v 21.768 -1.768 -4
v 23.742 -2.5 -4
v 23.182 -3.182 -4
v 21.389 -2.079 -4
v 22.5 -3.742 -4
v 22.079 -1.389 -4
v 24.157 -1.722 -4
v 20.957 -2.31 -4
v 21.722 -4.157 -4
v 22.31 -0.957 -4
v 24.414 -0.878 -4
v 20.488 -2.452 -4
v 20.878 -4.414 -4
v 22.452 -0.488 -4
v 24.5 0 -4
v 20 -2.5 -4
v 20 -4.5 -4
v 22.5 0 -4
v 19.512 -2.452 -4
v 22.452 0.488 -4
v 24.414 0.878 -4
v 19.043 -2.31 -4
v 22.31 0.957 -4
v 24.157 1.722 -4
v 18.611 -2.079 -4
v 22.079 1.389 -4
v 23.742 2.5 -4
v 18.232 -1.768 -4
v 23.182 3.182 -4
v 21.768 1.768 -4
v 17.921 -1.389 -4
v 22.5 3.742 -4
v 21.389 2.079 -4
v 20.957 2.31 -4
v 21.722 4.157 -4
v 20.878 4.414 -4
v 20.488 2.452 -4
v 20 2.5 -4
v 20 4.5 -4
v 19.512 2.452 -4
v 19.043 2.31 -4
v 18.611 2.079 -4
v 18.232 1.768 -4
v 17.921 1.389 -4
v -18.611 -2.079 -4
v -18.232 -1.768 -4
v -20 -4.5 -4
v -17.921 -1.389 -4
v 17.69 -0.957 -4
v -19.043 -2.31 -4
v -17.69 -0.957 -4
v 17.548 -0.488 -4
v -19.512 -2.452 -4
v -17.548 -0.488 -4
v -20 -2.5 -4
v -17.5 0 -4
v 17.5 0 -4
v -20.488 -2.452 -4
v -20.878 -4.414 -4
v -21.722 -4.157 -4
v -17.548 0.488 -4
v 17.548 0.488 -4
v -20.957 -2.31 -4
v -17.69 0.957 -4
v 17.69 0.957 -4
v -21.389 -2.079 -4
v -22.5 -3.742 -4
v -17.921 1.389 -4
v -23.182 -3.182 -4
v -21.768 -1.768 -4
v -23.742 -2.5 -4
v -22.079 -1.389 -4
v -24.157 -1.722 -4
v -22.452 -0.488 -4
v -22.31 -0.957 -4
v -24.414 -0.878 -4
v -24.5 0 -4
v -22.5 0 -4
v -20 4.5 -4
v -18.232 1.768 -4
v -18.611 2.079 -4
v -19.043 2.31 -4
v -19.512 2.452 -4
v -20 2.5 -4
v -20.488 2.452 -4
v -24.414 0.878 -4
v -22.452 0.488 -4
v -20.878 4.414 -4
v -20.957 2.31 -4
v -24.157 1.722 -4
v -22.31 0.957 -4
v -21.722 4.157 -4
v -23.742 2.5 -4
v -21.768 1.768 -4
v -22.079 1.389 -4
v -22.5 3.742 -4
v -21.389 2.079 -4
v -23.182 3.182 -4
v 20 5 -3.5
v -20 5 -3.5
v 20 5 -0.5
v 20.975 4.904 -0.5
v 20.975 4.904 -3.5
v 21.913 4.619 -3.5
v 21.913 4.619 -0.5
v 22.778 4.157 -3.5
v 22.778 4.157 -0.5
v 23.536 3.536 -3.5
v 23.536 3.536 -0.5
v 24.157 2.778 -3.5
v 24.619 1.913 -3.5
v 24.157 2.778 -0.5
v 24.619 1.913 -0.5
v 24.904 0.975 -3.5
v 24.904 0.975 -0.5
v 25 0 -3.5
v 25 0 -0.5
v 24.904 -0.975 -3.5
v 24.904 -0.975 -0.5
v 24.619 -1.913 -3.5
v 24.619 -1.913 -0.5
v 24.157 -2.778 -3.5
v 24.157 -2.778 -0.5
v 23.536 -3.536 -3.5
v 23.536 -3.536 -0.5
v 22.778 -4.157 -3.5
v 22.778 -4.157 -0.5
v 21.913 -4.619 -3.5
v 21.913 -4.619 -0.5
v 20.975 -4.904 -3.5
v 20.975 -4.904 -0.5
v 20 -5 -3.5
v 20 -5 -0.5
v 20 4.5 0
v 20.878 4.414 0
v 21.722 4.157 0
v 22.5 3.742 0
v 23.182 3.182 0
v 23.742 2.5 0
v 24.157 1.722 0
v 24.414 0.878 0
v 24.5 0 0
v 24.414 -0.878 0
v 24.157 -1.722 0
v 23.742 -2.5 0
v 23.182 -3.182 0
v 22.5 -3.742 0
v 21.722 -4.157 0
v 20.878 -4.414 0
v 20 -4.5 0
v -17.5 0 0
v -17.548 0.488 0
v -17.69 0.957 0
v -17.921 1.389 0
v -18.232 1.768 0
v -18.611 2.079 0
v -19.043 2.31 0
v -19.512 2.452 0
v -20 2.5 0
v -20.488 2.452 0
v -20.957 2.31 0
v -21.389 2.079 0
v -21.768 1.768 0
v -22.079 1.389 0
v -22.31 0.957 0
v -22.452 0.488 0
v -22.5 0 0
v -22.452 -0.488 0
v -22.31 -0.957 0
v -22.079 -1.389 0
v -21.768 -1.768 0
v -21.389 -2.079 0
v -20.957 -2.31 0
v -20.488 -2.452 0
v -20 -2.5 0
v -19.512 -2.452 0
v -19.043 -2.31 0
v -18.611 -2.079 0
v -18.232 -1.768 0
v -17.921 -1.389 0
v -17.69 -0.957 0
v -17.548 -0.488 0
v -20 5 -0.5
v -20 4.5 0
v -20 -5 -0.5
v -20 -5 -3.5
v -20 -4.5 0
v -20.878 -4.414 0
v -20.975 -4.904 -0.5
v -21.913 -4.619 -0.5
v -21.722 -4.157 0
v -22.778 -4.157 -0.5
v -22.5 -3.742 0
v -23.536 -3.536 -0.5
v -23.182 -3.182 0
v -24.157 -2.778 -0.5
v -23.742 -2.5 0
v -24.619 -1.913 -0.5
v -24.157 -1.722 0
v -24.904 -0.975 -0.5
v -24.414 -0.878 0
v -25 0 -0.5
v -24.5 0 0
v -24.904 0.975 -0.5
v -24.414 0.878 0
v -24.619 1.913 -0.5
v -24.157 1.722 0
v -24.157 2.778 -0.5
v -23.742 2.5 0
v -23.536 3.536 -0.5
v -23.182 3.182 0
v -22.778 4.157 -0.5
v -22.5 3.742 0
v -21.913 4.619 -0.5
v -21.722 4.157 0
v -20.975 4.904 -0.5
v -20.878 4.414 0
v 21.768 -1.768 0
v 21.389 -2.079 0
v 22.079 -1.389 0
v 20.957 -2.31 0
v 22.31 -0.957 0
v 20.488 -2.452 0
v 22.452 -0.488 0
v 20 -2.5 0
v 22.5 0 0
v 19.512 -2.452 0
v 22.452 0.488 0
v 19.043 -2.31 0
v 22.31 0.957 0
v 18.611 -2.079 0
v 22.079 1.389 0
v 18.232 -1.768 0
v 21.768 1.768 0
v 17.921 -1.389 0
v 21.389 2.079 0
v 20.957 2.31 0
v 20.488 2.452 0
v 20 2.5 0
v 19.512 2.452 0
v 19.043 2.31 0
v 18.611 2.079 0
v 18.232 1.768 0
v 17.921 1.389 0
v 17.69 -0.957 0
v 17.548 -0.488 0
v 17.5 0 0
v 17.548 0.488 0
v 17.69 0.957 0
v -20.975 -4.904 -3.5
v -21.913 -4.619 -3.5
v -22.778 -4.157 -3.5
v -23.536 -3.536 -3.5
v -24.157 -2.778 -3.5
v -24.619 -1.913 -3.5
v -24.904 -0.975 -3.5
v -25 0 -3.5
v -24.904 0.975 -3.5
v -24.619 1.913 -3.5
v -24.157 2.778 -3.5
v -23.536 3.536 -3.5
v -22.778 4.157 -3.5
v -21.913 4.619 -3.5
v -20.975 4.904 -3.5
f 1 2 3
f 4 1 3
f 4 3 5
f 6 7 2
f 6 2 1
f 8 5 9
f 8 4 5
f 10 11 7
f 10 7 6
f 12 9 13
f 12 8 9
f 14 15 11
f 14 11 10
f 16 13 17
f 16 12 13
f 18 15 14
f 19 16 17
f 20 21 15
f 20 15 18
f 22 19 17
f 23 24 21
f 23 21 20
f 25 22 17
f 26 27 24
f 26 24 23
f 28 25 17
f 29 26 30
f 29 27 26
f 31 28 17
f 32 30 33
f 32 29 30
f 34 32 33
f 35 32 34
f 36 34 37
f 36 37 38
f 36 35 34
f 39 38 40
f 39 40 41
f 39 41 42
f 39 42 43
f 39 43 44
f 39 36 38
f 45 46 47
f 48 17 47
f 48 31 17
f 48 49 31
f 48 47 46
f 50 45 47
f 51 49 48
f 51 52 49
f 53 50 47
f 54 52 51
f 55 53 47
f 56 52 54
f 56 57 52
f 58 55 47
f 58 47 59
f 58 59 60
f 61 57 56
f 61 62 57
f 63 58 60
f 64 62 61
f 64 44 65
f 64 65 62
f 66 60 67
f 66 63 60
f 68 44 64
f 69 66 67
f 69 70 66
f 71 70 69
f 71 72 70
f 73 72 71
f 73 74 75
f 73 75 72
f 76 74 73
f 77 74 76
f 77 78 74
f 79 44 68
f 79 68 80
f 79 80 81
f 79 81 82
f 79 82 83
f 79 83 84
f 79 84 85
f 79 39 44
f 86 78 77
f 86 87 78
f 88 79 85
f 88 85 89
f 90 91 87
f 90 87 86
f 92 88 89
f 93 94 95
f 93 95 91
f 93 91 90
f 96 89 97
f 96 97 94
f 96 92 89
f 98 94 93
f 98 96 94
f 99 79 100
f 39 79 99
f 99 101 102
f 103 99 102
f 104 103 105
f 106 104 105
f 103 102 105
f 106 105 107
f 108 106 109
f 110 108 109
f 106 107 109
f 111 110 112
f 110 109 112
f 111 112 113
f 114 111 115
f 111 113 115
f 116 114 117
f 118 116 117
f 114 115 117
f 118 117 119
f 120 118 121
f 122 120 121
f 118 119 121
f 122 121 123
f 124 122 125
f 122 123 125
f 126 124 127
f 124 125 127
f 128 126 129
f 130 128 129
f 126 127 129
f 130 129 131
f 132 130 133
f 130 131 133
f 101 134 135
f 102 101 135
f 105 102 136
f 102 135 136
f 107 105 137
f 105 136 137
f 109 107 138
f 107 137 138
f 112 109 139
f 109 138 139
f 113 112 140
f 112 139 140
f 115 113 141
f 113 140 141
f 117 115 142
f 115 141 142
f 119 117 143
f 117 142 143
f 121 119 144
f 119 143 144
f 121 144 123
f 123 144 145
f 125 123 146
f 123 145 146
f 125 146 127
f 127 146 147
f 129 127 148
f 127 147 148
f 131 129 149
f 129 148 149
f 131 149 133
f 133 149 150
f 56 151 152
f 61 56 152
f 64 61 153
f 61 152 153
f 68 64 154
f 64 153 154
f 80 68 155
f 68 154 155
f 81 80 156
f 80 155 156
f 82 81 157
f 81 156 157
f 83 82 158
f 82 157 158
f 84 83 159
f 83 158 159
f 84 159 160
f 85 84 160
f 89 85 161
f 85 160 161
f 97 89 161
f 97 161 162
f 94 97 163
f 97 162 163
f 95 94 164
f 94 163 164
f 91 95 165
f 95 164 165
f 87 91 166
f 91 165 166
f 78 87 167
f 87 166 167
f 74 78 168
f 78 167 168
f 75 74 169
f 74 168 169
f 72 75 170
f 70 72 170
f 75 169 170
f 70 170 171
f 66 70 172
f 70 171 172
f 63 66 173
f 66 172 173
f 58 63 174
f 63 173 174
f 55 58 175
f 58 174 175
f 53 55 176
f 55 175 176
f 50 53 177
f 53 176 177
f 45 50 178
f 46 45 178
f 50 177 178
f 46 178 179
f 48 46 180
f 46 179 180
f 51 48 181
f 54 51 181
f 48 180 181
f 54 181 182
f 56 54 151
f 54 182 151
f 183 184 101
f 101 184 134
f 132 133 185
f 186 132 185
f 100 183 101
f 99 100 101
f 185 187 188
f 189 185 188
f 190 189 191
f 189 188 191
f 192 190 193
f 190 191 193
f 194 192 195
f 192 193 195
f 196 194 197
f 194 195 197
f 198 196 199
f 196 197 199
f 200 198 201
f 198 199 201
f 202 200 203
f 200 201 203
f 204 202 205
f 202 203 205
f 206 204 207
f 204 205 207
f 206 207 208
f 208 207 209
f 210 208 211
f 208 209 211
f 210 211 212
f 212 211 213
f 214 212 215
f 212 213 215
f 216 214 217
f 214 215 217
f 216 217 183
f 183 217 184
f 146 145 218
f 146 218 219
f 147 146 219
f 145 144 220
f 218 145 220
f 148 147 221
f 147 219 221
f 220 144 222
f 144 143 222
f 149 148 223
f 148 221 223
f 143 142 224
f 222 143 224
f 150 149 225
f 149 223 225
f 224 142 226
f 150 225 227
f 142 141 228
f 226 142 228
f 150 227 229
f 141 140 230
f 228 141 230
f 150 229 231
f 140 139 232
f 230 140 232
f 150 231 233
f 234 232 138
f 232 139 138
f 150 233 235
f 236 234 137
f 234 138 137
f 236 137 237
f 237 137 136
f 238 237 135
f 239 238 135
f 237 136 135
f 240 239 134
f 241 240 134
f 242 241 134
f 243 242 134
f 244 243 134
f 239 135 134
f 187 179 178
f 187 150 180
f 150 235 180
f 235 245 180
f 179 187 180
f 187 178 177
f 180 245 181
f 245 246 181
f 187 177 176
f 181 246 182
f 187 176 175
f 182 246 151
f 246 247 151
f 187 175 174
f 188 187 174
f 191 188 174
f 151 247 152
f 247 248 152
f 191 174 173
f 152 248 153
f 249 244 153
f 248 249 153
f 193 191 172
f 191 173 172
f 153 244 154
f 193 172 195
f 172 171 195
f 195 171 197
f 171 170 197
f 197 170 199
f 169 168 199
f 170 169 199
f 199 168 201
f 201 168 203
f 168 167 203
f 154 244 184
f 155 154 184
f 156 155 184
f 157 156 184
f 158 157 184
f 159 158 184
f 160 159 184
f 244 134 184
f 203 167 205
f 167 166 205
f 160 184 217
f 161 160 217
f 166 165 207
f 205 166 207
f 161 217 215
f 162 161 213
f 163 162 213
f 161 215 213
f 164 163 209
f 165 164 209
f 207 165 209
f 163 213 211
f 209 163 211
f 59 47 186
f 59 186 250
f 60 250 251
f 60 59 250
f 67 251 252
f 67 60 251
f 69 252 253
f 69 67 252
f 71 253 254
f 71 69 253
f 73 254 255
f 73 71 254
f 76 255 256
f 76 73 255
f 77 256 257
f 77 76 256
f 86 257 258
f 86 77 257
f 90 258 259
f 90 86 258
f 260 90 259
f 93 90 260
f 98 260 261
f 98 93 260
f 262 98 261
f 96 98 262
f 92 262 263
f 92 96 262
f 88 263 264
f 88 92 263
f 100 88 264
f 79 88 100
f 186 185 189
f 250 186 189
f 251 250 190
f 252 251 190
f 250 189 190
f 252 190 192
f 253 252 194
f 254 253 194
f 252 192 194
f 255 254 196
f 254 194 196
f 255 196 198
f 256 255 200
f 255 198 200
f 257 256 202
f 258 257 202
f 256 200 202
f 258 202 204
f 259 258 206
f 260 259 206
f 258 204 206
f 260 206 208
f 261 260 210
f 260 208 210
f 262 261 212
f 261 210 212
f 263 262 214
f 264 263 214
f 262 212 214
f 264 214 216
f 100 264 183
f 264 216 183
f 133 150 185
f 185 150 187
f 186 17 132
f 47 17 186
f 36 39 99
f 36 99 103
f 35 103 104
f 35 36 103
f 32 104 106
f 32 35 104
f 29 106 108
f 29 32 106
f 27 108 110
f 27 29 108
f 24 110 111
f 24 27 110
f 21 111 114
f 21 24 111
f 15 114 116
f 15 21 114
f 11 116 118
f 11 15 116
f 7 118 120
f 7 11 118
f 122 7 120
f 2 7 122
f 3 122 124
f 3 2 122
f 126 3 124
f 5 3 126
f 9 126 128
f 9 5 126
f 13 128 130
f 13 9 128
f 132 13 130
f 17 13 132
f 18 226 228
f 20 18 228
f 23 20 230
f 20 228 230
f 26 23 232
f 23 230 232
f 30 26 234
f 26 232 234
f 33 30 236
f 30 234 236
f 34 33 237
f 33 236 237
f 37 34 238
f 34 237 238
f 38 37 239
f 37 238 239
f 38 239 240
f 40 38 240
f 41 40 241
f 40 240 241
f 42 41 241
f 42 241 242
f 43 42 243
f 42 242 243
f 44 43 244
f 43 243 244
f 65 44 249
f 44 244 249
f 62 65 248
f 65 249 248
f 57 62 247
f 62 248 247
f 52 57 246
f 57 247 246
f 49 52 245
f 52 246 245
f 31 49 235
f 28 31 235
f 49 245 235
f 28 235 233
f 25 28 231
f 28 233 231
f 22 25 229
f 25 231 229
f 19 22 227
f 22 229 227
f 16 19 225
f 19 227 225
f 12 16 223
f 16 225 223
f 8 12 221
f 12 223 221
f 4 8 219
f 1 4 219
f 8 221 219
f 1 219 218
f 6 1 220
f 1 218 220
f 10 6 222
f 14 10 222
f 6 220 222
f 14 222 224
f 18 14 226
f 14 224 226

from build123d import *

# Parameters (mm, degrees)
SKETCH1_R           = 2.5
BOSS_EXTRUDE1_DEPTH = 4
CHAMFER1_SIZE       = 0.5


with BuildPart() as part:
    # Sketch1 → Boss-Extrude1 (new body)
    with BuildSketch(Plane.XY):
        with BuildLine():
            Line((-20, 5), (20, 5))
            ThreePointArc((20, 5), (25, 0), (20, -5))
            Line((20, -5), (-20, -5))
            ThreePointArc((-20, -5), (-25, 0), (-20, 5))
        make_face()
        with Locations((-20, 0)):
            Circle(SKETCH1_R, mode=Mode.SUBTRACT)
        with Locations((20, 0)):
            Circle(SKETCH1_R, mode=Mode.SUBTRACT)
    extrude(amount=-BOSS_EXTRUDE1_DEPTH)

    # Chamfer1
    chamfer1_edges = [part.edges().sort_by_distance(p)[0] for p in [
        (25, 0, -4),
        (0, 5, -4),
        (-25, 0, -4),
        (0, 5, 0),
        (25, 0, 0),
        (0, -5, 0),
        (-25, 0, 0),
        (0, -5, -4),
    ]]
    chamfer(chamfer1_edges, length=CHAMFER1_SIZE)


solid = part.part
